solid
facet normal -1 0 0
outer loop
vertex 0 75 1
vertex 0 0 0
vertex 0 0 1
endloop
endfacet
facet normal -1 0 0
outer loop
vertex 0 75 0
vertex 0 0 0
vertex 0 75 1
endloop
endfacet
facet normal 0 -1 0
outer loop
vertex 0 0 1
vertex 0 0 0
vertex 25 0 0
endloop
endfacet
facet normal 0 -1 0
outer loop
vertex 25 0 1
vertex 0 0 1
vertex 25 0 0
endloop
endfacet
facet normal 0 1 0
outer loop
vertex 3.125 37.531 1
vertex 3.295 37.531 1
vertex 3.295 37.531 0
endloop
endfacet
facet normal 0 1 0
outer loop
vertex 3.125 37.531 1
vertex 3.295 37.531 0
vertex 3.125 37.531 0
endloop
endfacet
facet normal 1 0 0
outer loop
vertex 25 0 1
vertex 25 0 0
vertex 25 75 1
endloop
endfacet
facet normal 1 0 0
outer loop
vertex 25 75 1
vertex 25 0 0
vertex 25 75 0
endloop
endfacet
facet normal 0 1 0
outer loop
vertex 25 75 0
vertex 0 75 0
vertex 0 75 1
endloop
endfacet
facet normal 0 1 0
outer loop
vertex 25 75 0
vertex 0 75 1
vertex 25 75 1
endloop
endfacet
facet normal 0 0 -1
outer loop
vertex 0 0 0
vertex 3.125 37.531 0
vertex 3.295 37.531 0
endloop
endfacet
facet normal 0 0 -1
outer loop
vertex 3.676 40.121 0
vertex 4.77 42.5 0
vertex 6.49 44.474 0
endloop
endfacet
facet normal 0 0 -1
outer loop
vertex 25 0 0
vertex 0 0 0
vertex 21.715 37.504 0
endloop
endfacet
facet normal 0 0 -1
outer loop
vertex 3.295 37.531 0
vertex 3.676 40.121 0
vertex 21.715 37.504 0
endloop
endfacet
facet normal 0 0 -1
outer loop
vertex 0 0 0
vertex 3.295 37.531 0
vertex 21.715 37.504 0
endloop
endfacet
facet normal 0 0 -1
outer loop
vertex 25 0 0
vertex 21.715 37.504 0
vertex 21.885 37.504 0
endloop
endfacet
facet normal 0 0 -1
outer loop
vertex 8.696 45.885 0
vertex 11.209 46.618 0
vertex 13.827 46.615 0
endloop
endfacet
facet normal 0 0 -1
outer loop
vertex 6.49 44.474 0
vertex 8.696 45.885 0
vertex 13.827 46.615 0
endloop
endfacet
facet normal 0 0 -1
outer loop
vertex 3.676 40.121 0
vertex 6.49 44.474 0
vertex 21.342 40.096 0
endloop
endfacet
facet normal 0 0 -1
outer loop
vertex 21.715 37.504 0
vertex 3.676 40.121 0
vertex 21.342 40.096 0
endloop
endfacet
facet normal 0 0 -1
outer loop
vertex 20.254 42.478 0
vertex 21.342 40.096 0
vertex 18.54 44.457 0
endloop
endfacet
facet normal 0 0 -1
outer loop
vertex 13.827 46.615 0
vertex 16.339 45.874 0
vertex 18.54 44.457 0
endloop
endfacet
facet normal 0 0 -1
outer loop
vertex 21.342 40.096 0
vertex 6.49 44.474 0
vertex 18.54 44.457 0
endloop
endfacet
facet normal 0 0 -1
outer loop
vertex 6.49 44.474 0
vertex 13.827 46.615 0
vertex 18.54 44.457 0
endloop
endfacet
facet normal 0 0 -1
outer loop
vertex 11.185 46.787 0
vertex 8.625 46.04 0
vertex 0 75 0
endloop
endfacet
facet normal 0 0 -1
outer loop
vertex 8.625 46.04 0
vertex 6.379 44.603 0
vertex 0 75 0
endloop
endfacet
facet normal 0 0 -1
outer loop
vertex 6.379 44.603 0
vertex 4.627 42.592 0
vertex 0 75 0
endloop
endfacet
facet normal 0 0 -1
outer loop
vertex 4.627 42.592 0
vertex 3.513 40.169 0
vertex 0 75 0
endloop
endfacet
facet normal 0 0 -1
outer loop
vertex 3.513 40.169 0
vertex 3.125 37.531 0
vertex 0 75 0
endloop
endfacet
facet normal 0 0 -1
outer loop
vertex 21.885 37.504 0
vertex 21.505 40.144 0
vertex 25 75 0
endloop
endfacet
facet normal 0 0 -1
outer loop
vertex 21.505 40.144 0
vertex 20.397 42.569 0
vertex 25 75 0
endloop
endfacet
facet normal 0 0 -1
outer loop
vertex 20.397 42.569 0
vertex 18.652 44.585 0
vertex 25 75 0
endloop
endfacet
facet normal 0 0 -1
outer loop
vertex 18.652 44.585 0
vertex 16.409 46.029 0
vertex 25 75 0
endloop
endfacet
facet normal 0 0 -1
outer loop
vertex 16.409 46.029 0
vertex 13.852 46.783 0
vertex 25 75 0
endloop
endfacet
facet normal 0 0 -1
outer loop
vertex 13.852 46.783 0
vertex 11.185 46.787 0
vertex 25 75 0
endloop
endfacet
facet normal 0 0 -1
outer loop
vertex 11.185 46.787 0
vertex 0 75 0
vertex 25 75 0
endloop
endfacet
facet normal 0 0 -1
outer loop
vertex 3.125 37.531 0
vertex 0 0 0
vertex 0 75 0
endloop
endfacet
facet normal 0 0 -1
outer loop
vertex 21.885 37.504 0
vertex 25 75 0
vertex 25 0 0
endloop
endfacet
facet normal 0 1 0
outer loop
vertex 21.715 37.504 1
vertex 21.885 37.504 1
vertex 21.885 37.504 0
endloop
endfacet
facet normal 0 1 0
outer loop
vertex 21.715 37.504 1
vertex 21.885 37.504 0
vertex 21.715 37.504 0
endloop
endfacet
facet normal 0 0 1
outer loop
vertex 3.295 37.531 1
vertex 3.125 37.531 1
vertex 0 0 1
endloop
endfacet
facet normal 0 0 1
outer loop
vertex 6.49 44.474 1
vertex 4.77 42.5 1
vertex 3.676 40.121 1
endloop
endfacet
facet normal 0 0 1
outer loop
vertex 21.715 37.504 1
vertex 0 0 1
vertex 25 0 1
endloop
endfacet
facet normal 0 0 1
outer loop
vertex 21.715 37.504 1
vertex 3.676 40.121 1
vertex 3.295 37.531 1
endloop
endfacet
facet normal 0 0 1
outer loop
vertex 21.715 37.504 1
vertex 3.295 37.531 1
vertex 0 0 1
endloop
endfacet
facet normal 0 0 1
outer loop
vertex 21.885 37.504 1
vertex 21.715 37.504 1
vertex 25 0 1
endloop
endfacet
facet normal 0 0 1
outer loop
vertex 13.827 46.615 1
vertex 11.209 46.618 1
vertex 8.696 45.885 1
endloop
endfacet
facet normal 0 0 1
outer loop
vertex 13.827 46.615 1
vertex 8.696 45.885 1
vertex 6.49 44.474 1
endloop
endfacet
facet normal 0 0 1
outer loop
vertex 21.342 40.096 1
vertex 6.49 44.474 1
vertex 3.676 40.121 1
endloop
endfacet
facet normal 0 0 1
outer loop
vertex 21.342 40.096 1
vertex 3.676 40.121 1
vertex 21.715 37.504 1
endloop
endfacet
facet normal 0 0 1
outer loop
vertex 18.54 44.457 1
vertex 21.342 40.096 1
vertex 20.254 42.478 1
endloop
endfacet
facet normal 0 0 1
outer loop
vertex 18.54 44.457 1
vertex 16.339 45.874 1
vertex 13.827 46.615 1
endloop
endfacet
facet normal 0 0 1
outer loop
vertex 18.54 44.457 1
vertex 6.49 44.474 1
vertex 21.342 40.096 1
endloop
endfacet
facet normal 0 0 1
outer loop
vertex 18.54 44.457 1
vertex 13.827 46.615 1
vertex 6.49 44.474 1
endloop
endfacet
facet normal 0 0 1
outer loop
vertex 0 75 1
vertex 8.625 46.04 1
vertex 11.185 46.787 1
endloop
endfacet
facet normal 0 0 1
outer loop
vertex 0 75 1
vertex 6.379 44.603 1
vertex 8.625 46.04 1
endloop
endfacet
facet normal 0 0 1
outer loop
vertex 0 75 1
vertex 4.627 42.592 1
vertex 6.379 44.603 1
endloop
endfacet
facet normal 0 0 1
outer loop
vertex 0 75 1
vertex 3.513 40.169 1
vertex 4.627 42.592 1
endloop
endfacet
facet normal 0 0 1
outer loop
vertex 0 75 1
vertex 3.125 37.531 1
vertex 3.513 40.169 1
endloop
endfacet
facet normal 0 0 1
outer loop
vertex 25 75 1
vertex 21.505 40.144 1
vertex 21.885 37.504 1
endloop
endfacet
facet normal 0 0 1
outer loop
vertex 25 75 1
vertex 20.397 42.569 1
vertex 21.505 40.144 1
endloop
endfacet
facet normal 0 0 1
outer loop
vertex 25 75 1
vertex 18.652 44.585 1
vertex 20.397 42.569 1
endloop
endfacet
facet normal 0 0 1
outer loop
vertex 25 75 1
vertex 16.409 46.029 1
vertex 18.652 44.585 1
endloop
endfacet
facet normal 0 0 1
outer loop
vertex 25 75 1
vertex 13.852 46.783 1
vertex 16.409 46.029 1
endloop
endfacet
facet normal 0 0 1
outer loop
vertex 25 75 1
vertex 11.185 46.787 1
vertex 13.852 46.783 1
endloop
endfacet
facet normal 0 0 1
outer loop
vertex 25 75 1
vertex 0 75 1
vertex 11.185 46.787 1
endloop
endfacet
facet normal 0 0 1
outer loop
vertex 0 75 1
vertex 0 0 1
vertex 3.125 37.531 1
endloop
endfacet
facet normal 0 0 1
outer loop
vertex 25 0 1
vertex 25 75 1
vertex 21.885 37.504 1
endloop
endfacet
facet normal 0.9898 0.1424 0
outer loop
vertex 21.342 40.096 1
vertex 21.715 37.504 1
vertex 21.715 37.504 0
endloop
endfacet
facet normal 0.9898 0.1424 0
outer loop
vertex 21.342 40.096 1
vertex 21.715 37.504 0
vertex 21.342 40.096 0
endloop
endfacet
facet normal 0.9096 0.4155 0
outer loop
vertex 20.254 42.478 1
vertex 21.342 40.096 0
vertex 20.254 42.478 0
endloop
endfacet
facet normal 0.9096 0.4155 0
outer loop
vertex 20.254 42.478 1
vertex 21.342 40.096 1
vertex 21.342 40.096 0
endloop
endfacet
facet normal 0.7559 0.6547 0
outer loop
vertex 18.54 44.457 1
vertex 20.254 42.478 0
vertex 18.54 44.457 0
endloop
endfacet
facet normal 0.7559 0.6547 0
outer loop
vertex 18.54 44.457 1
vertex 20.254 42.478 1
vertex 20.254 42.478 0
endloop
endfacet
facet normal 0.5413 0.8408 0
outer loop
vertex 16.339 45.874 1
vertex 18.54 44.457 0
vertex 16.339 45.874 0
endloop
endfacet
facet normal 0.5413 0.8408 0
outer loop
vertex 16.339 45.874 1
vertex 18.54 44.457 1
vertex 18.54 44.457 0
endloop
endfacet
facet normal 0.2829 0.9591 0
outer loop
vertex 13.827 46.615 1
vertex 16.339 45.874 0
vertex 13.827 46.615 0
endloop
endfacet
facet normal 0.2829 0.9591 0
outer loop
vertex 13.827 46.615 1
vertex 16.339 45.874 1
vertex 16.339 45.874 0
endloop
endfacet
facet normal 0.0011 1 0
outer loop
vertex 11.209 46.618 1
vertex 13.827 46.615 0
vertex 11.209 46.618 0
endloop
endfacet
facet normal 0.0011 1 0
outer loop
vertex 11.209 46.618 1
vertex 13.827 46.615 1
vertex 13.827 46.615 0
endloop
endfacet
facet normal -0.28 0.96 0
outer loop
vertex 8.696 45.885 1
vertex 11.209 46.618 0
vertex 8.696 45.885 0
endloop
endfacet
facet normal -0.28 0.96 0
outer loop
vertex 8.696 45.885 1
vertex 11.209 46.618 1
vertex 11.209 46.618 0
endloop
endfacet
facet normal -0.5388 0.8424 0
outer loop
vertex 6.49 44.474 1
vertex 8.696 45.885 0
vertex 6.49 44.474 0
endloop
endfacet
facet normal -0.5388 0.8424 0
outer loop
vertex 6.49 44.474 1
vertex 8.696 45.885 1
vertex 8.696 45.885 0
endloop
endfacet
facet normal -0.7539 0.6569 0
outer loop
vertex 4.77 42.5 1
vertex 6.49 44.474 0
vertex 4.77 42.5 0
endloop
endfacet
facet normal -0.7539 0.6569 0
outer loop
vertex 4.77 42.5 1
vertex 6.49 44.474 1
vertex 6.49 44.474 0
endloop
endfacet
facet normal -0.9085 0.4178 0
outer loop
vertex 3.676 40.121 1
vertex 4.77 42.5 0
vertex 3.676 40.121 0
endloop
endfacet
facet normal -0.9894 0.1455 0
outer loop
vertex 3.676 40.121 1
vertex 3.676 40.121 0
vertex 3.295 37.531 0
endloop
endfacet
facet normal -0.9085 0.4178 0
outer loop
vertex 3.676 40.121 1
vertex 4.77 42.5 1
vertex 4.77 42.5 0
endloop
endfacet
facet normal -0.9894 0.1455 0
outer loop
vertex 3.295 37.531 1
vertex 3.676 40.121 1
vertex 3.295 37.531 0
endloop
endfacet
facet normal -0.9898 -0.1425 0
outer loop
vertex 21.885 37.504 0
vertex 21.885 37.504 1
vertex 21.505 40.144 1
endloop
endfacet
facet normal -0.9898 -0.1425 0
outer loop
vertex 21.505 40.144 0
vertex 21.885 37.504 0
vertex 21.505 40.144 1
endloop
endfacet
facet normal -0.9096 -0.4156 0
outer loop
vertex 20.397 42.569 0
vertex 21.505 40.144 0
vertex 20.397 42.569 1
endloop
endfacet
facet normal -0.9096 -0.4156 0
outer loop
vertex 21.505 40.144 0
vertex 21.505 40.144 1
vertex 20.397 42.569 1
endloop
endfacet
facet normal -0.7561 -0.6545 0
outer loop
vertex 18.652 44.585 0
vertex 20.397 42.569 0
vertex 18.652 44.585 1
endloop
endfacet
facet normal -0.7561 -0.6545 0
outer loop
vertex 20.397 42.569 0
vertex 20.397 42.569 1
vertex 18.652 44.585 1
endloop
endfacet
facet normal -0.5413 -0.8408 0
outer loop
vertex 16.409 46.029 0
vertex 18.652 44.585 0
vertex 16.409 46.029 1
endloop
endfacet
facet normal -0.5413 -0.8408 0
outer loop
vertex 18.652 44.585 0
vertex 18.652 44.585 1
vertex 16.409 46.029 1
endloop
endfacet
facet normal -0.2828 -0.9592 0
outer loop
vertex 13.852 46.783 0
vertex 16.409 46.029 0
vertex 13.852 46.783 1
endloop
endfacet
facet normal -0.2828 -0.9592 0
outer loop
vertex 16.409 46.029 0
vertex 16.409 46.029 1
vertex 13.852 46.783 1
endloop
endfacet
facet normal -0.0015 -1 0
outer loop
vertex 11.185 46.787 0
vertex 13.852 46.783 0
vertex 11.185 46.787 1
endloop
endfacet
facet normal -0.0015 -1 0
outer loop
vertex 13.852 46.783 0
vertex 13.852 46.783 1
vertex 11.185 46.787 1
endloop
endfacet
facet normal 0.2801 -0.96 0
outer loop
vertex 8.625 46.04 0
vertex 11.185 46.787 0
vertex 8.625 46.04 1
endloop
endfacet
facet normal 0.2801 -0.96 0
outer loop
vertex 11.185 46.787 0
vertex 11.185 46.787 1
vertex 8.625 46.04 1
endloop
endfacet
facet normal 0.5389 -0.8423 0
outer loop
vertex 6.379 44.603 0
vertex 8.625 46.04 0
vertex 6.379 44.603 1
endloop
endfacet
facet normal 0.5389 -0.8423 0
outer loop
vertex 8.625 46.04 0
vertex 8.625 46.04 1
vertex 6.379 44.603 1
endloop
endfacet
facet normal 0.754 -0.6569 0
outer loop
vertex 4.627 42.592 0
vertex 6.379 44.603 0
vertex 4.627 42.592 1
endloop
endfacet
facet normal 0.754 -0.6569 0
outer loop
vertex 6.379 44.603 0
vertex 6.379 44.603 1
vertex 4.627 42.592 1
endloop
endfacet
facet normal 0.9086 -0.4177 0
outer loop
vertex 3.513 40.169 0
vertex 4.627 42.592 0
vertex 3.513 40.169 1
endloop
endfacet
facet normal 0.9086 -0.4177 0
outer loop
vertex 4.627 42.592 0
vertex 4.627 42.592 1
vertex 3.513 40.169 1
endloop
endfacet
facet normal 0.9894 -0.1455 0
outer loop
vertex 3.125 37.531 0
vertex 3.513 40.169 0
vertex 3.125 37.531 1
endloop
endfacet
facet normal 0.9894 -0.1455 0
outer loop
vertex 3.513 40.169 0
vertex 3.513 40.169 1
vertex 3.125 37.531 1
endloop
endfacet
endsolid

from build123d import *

# Parameters (mm, degrees)
PAD005_DEPTH      = 2
PAD005_DEPTH_BACK = 2
SKETCH021_W       = 25
SKETCH021_H       = 75
PAD020_DEPTH      = 1


with BuildPart() as body005:
    # Sketch006 → Pad005 (new body, two sides)
    with BuildSketch(Plane.XY) as pad005_sk:
        with BuildLine():
            ThreePointArc((21.884948, 37.50431), (12.518321, 46.87999), (3.125, 37.531055))
            Line((3.295001, 37.531055), (3.125, 37.531055))
            ThreePointArc((21.714948, 37.50431), (12.518321, 46.70999), (3.295001, 37.531055))
            Line((21.884948, 37.50431), (21.714948, 37.50431))
        make_face()
    extrude(amount=PAD005_DEPTH)
    extrude(pad005_sk.sketch, amount=-PAD005_DEPTH_BACK)


with BuildPart() as body019:
    # Sketch021 → Pad020 (new body)
    with BuildSketch(Plane.XY):
        with Locations((12.5, 37.5)):
            Rectangle(SKETCH021_W, SKETCH021_H)
    extrude(amount=PAD020_DEPTH)

    # Boolean004: cut Body005
    add(body005.part, mode=Mode.SUBTRACT)


solid = body019.part
